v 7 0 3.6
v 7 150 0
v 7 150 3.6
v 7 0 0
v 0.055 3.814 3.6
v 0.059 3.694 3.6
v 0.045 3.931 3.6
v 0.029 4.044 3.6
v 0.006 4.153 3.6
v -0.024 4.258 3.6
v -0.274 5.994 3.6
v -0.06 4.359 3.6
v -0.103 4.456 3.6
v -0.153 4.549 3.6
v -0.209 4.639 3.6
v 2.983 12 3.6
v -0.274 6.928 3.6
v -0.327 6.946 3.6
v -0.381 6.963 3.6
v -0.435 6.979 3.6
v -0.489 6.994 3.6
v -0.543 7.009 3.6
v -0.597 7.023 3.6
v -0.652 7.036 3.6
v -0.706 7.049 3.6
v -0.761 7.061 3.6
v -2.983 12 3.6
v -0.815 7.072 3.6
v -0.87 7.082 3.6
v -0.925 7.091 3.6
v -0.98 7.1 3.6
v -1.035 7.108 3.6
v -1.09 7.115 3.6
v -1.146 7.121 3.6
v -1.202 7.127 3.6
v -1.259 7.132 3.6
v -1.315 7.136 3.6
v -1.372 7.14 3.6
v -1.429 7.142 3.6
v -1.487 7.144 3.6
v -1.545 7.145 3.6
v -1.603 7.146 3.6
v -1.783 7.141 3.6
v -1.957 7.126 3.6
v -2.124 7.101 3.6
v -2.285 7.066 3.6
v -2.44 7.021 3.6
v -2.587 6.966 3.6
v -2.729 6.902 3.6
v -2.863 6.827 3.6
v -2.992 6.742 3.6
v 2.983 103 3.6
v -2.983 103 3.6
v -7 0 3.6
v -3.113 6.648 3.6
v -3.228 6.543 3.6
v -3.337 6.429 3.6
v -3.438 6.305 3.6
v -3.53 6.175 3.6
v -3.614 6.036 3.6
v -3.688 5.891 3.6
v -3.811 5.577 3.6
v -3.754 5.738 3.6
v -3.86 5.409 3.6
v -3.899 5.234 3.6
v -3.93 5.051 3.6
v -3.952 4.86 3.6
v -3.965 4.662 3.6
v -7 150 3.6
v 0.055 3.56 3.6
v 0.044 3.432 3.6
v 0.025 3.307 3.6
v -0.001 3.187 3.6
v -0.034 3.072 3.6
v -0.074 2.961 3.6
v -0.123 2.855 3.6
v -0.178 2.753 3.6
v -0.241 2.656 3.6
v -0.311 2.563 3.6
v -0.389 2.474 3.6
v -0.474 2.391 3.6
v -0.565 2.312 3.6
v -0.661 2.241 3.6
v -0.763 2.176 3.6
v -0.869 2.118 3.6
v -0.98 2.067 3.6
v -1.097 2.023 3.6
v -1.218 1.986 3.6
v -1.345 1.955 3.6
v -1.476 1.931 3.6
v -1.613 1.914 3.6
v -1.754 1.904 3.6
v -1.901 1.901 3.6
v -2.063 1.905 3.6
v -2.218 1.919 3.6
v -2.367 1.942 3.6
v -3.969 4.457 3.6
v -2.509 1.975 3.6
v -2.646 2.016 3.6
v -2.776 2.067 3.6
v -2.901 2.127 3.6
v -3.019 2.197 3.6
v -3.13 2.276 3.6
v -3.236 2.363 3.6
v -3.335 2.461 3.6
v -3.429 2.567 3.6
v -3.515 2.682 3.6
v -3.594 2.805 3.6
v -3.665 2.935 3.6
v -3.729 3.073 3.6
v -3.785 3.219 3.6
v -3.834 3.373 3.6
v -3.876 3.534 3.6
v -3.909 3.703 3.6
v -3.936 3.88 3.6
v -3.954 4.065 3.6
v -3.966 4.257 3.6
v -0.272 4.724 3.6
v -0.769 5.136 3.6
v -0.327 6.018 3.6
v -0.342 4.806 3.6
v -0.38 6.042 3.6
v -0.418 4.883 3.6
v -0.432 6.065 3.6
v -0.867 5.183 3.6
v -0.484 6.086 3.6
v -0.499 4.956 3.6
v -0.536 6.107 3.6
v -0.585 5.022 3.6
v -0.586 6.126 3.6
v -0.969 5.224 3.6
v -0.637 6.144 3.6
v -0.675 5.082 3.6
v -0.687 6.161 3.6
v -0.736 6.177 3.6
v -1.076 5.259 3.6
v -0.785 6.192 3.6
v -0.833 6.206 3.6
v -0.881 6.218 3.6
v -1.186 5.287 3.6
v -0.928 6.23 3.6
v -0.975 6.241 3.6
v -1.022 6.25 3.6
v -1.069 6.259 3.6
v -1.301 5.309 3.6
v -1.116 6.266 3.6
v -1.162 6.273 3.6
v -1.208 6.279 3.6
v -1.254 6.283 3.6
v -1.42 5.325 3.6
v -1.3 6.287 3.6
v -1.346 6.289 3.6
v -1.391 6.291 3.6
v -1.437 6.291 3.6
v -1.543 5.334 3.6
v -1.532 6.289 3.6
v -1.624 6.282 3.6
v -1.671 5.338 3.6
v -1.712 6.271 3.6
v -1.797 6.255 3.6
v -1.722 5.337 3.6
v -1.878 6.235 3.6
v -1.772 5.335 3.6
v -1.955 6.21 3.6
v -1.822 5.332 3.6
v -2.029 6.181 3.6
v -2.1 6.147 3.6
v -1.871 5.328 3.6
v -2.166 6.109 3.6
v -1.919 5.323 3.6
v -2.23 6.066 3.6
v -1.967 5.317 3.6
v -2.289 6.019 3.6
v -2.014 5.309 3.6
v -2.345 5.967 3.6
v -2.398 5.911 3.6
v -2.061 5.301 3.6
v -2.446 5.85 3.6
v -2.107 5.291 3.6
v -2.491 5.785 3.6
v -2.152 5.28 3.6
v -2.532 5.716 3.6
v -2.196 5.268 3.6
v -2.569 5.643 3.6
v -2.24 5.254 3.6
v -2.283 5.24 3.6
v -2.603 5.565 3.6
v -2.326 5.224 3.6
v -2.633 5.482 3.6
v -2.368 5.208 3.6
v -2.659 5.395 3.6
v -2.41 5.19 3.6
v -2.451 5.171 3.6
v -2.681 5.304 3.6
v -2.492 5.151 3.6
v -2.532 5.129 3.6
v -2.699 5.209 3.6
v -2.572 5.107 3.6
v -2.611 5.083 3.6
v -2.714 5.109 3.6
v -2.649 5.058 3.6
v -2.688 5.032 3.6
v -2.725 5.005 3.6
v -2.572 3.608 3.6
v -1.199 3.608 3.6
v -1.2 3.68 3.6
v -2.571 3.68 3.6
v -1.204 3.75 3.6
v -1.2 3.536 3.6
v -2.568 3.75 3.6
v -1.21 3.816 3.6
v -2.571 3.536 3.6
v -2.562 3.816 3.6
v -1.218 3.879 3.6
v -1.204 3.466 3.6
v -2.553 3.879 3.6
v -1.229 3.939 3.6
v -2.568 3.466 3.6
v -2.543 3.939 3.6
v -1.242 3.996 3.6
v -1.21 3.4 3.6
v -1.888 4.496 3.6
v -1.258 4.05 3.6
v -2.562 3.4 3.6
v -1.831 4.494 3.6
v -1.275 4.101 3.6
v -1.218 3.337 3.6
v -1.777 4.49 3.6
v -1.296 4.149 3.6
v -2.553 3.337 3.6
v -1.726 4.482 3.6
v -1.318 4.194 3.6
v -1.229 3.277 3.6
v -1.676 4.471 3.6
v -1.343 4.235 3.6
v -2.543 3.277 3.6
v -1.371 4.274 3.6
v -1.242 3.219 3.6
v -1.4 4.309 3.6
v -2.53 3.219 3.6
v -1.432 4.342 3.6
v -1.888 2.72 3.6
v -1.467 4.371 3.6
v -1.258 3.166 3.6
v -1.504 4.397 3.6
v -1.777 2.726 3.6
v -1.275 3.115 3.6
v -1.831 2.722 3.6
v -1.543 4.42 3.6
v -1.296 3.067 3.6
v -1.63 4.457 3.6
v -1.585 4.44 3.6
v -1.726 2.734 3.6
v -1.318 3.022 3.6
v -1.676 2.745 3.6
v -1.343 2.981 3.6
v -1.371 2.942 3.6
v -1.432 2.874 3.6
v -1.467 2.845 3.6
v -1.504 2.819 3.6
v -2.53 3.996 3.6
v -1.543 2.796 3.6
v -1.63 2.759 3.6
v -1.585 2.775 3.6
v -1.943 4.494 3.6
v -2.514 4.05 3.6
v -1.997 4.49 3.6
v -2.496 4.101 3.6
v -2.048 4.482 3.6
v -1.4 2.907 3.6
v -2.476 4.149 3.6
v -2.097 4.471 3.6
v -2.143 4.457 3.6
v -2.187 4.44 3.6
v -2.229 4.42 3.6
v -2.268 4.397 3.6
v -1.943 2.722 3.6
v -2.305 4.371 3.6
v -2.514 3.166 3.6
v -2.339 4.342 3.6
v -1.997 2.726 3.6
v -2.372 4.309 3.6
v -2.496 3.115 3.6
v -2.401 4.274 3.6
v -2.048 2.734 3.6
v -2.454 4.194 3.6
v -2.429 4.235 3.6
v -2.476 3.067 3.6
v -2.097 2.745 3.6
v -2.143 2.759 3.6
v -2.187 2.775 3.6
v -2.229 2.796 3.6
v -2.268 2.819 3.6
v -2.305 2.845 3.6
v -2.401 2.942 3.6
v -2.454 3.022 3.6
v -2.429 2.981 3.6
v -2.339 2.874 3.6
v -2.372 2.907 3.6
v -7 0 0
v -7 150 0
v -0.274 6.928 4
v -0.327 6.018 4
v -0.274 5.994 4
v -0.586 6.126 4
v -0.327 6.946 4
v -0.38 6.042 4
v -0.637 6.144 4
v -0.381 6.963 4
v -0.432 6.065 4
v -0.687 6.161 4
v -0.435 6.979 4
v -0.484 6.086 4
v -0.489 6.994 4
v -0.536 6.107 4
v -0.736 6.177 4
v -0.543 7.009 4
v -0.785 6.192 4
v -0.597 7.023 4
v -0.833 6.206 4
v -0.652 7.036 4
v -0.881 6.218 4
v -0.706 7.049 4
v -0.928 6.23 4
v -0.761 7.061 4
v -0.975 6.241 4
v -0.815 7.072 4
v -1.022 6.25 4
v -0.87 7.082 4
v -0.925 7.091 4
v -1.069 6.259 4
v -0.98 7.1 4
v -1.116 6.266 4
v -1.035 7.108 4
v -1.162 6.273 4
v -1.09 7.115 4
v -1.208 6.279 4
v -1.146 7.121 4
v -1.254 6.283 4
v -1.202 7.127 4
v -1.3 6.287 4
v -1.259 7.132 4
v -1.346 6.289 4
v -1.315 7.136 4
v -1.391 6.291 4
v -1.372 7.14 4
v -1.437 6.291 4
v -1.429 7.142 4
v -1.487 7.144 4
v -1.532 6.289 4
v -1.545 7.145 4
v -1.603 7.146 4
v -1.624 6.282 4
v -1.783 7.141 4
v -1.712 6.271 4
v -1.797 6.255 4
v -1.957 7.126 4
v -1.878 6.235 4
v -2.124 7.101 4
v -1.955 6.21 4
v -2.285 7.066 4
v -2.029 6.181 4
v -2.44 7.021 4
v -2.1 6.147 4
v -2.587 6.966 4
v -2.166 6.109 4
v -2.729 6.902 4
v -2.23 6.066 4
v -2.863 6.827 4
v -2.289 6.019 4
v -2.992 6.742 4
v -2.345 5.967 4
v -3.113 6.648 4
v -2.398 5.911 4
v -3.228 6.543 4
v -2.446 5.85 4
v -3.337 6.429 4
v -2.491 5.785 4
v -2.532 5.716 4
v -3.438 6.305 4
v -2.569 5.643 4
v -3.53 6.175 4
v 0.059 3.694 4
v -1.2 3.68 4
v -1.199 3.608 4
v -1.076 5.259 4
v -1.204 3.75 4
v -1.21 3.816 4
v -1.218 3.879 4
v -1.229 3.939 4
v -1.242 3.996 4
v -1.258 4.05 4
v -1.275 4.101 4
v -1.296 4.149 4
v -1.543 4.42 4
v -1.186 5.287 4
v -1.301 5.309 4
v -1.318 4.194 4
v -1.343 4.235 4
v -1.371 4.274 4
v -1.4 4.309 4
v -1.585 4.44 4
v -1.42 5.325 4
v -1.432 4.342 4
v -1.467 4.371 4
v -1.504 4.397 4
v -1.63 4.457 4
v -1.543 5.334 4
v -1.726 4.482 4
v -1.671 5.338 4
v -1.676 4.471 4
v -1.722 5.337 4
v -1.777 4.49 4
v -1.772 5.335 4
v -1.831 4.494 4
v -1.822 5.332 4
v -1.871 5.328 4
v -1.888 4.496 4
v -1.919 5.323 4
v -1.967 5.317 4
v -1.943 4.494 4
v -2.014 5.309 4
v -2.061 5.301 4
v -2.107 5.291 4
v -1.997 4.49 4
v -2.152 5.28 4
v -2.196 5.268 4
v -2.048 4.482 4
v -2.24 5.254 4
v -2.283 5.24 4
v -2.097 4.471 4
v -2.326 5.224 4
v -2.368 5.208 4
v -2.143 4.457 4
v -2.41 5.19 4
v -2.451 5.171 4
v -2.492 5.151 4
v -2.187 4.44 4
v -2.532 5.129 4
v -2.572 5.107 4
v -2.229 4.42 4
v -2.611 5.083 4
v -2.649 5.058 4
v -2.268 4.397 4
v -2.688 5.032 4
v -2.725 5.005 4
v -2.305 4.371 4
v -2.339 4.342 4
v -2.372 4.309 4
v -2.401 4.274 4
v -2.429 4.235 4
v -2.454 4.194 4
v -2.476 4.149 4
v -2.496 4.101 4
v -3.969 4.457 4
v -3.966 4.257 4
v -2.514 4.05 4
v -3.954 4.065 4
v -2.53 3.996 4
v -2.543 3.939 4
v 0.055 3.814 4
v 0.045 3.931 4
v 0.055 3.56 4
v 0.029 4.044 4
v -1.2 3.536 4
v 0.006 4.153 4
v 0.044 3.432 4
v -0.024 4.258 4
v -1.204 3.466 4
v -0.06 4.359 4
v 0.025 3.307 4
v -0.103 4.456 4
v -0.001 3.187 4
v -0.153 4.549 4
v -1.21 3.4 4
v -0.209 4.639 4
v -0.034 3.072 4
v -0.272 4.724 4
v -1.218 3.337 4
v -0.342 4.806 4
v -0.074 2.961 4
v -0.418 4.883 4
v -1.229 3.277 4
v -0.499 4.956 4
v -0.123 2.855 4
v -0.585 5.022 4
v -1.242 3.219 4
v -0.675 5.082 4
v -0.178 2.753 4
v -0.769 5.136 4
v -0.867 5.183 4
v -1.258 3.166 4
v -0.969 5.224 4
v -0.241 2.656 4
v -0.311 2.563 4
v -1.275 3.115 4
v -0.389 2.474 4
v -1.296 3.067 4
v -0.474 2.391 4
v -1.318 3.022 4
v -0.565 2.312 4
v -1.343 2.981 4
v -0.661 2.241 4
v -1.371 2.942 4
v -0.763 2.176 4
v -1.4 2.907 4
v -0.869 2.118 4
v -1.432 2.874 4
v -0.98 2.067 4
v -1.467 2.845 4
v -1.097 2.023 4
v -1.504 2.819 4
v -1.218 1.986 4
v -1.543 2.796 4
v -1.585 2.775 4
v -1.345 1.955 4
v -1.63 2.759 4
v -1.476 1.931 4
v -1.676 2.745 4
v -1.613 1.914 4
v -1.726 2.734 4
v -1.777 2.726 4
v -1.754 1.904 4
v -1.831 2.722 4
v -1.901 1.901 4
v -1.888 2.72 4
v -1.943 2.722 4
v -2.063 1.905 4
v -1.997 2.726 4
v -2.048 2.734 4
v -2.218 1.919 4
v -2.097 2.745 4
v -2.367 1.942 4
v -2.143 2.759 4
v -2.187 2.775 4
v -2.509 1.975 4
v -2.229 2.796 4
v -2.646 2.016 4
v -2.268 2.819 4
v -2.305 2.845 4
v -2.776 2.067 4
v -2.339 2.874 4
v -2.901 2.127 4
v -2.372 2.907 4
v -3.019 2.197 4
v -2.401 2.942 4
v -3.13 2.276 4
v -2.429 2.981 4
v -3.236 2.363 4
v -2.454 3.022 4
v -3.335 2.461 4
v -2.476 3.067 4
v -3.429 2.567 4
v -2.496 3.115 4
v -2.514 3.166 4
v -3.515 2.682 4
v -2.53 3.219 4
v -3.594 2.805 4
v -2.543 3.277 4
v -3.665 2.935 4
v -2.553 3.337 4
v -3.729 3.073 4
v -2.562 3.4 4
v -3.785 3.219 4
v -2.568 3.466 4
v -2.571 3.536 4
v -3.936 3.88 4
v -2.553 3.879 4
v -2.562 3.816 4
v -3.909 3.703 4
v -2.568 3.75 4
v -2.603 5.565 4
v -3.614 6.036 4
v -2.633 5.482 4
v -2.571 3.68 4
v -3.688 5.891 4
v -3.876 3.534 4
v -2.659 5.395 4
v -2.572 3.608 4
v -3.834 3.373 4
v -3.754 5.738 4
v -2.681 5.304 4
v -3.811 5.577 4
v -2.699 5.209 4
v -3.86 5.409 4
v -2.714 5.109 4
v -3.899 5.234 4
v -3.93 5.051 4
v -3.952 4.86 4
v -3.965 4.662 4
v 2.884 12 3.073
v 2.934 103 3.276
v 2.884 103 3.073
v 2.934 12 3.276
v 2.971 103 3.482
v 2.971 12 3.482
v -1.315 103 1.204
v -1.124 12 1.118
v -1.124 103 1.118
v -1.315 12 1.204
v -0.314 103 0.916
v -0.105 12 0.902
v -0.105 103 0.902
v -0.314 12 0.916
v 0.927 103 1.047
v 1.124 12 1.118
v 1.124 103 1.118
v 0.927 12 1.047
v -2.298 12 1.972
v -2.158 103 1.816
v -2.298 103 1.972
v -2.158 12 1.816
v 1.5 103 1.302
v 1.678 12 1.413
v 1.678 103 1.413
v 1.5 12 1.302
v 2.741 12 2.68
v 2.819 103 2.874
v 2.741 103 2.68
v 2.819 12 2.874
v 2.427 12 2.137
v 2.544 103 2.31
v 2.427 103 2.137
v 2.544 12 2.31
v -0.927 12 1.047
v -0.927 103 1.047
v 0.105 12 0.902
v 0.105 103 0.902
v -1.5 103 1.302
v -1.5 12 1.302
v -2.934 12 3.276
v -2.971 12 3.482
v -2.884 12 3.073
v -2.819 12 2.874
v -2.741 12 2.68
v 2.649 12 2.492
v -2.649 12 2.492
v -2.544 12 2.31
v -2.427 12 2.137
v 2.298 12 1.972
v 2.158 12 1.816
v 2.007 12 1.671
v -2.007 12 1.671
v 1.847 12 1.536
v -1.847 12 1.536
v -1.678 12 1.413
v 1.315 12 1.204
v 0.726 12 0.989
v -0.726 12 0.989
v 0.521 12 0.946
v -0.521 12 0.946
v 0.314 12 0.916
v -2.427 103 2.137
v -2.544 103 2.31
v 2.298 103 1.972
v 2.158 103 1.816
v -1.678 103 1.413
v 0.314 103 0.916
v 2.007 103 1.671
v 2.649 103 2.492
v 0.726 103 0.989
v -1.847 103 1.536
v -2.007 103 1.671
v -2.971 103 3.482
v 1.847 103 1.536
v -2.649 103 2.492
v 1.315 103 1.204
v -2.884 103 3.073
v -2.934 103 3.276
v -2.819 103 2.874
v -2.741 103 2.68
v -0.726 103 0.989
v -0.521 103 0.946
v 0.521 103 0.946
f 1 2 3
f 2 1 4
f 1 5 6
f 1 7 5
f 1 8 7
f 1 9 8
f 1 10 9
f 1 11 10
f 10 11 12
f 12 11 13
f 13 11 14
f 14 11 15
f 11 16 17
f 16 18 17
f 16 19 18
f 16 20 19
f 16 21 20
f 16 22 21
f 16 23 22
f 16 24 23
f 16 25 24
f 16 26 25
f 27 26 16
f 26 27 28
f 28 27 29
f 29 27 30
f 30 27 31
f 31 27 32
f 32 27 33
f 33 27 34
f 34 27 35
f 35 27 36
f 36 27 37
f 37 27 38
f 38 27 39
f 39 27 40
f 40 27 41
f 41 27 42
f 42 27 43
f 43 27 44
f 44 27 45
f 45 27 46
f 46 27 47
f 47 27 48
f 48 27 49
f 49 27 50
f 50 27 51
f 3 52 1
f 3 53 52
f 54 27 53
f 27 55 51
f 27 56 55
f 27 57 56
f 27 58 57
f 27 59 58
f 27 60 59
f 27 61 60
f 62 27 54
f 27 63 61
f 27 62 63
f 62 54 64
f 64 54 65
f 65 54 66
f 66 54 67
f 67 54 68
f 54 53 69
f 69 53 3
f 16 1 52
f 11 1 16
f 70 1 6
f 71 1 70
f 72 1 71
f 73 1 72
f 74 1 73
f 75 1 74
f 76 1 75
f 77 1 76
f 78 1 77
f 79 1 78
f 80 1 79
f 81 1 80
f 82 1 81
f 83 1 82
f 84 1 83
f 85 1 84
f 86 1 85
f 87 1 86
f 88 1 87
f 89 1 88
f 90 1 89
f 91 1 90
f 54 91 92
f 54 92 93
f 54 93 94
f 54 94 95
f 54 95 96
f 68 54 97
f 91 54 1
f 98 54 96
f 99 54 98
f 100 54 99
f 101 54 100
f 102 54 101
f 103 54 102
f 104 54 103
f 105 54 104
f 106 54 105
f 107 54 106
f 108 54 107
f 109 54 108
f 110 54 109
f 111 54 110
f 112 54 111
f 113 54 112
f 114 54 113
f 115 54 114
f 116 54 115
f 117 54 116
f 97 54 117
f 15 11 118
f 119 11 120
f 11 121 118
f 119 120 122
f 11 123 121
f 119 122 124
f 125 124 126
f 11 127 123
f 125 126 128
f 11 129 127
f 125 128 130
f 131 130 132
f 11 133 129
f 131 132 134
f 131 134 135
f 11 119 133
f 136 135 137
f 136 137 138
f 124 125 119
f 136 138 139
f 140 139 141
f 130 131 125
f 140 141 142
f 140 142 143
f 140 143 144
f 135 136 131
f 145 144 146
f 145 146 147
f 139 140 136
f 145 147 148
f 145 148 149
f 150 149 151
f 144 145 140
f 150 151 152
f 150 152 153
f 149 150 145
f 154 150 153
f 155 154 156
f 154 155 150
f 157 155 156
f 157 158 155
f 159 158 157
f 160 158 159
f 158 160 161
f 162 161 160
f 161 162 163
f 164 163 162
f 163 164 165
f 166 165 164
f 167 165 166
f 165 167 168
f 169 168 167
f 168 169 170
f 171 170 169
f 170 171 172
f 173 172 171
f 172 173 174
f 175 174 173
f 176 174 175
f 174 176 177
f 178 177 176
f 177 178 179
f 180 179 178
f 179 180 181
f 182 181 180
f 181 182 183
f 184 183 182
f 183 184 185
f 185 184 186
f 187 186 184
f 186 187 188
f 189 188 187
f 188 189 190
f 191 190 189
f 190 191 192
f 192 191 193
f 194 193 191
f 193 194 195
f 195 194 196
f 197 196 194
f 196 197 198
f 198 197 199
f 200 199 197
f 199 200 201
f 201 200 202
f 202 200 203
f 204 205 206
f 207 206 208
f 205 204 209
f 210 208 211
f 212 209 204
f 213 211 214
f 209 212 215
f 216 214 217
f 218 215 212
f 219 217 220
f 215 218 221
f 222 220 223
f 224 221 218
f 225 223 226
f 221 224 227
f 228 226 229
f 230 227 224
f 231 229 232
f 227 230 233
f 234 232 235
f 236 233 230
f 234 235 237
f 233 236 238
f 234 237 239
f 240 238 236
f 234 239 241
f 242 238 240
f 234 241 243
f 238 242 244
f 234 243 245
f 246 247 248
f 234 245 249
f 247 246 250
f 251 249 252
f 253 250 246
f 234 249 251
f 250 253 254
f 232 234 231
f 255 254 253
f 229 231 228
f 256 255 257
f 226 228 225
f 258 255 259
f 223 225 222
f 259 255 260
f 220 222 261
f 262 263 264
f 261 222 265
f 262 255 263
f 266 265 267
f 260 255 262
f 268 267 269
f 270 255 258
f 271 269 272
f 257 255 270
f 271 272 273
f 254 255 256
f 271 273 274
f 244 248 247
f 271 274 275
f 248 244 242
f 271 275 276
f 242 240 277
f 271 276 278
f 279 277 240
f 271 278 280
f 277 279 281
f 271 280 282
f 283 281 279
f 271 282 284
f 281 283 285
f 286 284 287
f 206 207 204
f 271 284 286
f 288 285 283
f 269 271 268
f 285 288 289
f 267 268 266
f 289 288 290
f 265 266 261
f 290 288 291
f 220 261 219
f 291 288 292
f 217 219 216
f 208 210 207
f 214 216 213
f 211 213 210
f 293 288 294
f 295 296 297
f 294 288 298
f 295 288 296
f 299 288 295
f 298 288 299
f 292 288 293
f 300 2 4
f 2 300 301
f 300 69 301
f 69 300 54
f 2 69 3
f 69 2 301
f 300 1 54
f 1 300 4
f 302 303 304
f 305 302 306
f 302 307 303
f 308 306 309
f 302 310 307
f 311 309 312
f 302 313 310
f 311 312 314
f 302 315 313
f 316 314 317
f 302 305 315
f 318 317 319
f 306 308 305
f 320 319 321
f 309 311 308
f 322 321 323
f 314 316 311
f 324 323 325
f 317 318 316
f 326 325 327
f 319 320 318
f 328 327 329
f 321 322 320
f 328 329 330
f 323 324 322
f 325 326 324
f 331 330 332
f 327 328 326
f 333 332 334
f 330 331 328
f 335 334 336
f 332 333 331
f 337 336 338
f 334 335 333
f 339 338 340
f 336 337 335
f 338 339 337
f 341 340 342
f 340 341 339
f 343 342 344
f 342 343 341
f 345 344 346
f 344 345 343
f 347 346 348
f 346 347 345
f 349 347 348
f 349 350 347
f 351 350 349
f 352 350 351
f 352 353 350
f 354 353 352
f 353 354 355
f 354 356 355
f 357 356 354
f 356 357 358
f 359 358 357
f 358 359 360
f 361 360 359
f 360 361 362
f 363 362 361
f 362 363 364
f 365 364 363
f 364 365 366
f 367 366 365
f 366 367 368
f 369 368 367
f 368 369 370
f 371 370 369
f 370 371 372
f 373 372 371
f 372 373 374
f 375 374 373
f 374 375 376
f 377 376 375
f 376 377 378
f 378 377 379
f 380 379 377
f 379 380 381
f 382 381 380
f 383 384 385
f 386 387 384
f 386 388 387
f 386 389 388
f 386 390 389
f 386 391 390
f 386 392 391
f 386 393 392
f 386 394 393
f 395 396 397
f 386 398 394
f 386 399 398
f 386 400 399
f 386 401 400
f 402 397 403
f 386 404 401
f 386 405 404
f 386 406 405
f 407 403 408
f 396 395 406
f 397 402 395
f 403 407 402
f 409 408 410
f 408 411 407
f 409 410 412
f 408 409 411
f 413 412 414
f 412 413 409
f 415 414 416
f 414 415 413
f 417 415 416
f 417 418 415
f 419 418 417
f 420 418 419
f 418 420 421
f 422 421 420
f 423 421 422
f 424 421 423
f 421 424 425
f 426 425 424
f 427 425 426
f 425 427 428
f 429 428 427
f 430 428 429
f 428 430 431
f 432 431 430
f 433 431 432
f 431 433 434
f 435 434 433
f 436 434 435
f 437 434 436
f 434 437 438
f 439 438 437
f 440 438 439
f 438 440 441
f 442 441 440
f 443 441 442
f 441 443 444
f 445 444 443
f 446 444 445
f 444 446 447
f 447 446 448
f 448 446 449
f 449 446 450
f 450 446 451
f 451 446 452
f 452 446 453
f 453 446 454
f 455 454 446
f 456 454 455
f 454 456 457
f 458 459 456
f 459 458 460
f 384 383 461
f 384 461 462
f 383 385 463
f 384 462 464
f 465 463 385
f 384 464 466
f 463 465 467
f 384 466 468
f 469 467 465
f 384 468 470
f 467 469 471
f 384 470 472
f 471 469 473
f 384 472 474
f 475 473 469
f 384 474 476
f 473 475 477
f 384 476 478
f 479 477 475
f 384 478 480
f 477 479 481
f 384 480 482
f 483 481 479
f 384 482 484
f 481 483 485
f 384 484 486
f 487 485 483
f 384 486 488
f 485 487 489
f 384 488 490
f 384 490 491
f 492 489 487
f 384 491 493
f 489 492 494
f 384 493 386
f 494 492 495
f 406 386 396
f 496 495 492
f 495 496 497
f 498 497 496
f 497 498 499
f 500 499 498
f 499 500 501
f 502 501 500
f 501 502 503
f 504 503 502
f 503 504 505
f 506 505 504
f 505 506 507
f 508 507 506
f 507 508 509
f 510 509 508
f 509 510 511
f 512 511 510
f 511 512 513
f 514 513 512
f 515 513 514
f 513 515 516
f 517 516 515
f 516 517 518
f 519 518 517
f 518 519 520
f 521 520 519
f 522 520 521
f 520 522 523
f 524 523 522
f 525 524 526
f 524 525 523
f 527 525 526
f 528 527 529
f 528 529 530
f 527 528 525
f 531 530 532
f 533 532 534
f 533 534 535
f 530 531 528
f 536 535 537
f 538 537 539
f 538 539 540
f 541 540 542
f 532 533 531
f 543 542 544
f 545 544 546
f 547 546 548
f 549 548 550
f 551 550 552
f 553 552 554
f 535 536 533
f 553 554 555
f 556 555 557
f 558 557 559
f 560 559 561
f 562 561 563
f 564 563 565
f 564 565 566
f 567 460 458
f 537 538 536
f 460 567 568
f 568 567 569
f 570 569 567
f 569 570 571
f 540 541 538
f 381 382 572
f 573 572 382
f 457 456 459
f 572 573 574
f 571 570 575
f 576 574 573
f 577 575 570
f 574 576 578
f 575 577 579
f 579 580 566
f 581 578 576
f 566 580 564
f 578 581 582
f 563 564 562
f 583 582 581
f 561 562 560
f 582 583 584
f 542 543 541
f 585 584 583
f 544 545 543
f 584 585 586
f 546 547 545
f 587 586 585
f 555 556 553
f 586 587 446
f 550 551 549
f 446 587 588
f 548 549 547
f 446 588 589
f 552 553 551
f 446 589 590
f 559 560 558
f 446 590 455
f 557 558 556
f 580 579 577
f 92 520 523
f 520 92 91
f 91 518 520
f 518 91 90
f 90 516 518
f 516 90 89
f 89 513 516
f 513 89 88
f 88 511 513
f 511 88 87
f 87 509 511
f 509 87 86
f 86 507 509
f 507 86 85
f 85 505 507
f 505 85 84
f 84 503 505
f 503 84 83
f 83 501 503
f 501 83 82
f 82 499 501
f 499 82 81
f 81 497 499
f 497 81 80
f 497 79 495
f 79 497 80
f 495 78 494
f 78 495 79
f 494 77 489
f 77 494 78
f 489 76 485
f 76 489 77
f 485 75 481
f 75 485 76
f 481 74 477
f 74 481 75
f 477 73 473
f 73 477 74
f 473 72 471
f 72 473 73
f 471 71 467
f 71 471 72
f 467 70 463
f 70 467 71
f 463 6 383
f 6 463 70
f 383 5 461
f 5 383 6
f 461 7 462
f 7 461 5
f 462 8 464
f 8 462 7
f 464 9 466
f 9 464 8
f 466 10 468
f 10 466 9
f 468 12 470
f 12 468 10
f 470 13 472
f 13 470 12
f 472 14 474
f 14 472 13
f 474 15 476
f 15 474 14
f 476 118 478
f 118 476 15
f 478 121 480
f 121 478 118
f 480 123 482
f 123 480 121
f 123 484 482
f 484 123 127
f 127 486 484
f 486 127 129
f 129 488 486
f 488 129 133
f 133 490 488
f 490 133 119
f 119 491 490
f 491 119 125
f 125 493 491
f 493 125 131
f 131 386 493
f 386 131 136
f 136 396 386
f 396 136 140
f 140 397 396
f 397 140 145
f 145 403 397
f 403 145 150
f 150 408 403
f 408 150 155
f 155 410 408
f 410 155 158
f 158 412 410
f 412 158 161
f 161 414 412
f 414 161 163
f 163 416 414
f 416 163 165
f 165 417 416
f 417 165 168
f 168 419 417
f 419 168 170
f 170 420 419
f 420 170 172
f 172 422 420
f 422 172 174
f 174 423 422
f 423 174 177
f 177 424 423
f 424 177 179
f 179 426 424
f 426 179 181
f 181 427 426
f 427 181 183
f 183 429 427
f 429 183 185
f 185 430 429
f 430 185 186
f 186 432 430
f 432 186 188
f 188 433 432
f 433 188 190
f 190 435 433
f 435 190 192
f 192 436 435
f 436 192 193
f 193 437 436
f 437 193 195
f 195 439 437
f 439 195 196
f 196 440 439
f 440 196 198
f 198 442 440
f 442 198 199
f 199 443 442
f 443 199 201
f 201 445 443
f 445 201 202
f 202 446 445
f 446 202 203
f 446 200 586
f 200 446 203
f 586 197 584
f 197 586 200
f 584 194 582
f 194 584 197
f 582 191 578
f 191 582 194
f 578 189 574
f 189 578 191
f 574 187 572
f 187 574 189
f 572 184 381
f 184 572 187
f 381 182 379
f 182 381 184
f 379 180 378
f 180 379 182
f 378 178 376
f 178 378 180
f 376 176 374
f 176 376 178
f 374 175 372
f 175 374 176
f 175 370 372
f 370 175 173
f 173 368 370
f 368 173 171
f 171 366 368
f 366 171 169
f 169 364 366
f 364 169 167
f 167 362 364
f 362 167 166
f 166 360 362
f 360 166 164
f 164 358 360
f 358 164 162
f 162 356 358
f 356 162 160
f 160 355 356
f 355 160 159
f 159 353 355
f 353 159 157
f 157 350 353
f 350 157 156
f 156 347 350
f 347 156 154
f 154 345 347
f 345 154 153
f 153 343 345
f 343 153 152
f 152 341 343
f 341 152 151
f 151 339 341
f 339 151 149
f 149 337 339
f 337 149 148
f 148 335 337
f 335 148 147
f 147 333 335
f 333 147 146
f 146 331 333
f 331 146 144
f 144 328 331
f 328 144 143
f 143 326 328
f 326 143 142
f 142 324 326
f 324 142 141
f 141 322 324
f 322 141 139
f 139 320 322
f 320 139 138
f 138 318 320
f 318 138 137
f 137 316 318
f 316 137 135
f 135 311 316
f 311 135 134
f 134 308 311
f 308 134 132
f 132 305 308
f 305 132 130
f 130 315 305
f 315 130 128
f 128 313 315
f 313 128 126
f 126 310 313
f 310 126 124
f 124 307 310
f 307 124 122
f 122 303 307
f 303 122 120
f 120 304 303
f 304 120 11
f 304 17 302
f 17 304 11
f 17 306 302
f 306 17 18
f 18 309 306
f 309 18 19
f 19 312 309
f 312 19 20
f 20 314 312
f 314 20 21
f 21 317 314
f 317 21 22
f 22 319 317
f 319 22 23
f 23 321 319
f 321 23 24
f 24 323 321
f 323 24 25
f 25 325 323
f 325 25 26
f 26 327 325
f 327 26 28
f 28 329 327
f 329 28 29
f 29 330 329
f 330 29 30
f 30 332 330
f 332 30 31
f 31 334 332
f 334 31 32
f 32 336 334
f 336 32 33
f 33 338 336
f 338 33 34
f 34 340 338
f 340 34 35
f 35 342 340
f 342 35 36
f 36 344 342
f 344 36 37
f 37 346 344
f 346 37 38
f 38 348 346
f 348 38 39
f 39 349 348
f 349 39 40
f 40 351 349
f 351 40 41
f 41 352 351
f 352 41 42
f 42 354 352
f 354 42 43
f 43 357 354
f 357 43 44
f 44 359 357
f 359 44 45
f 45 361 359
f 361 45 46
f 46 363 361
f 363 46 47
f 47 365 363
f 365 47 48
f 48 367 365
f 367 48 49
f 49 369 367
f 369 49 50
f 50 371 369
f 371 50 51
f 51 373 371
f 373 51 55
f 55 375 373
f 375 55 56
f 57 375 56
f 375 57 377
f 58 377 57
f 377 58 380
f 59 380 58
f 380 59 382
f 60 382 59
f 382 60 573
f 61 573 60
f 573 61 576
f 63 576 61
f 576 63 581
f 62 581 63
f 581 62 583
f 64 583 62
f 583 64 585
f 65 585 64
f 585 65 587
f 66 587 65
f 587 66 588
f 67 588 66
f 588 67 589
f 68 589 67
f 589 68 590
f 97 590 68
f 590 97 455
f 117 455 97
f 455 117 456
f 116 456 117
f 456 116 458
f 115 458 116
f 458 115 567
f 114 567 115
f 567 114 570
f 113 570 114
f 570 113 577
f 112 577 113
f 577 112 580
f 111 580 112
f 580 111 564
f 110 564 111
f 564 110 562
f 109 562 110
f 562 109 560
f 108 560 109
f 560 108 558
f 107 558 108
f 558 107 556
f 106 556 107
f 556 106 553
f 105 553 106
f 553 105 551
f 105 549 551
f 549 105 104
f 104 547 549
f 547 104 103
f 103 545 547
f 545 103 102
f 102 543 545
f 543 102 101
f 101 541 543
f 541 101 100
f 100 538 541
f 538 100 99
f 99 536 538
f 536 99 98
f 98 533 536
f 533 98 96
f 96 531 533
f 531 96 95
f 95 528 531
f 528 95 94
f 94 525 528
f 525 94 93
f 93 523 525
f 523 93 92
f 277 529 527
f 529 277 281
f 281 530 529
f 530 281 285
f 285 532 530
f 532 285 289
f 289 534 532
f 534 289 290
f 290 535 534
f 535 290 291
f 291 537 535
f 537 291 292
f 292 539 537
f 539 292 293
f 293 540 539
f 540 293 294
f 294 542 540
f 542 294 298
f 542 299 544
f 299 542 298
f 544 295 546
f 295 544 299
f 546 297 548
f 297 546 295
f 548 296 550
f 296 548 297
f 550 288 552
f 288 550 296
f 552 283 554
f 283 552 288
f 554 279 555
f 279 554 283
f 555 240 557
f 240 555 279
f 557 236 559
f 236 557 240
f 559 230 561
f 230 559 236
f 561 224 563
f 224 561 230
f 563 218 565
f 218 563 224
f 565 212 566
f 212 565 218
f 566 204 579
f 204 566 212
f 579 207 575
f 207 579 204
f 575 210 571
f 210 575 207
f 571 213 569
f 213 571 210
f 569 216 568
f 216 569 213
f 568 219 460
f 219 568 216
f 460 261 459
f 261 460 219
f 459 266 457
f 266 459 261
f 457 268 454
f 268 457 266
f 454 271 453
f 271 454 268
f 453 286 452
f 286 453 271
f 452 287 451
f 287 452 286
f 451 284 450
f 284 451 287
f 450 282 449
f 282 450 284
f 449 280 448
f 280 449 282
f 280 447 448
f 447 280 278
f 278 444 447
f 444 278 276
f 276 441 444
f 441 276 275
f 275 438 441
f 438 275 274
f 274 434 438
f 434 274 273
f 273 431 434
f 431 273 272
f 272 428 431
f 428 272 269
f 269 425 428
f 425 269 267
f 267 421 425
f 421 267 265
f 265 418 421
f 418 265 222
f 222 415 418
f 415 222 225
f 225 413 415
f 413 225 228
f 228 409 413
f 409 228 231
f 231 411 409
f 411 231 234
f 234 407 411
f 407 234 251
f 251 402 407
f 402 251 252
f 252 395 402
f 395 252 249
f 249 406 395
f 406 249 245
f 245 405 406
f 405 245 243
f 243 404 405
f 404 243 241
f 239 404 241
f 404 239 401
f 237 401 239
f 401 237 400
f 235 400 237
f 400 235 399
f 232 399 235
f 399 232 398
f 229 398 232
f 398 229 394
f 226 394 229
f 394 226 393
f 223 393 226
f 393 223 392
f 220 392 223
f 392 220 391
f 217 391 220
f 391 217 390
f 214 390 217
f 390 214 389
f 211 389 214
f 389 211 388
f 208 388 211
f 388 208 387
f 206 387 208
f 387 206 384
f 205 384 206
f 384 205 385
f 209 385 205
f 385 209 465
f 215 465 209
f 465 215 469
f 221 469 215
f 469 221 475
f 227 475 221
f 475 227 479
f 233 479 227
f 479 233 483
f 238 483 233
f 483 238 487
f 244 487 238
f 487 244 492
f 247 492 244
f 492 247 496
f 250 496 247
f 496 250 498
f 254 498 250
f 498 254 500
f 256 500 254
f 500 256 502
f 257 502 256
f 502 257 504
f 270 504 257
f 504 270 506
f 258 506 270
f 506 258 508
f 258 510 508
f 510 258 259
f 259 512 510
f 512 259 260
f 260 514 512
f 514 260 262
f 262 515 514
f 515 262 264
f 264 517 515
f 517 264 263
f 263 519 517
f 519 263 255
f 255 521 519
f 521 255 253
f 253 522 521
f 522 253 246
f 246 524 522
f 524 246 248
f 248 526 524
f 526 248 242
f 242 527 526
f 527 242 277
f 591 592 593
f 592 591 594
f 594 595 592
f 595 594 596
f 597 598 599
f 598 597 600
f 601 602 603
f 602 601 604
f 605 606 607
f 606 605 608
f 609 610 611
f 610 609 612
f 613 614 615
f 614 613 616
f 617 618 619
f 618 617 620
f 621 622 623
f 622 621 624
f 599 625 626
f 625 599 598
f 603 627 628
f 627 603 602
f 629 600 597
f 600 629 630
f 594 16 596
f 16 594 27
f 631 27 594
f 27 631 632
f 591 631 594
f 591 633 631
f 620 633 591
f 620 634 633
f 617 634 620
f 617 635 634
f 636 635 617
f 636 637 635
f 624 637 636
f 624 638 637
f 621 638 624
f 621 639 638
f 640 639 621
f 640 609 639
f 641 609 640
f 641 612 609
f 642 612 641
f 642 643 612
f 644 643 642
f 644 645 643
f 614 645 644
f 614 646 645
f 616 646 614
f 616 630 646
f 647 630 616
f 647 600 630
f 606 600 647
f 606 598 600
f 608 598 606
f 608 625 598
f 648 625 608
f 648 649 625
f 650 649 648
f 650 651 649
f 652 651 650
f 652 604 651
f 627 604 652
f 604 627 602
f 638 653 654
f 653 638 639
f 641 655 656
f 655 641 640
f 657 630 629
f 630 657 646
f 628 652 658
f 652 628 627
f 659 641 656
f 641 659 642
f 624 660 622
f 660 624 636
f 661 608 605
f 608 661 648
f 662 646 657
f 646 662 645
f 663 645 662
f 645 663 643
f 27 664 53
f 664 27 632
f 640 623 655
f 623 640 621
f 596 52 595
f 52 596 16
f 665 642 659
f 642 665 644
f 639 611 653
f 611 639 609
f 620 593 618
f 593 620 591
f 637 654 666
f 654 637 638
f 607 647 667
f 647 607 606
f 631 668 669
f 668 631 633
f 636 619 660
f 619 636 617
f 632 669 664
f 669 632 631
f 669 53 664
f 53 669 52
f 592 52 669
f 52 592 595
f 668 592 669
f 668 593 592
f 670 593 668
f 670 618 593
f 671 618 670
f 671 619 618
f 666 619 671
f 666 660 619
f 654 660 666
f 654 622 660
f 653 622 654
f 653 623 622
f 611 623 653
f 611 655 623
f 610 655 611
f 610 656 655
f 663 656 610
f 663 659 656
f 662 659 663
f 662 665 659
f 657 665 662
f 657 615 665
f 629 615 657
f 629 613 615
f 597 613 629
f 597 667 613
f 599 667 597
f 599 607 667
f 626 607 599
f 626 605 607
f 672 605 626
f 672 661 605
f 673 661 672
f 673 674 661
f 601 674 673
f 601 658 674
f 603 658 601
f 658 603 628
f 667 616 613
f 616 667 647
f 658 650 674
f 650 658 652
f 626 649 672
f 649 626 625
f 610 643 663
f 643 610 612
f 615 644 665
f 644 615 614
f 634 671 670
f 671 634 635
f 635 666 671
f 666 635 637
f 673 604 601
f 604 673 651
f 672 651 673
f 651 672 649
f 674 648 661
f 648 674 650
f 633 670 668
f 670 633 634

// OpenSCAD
// file: module/drill-bit-storage.scad
/*
    Drill bit storage
*/

$fn=90;  // accuracy


// Constants (Don't change)
storageLenght = 100; // Not Bit lenght
maxBitLenght  = 70;  // Check bit lenght
storageWidth  = 10;  // Minimum width

// Bit dependent
bitDiameter = 4.0;



module drillBitStorage (bitDiameter,maxBitLenght,
	storageWidth,storageLenght){

// Automatic Variables  (Don't change)
diameterText      = str(bitDiameter);
storageHight      = bitDiameter*0.6; 
bitRadius         = bitDiameter/2;
bitPositionHeight = storageHight+bitDiameter*0.05; 


// Delition for crating drill track
difference() {

// Union for text and storage
union(){

// Storage 
translate([
    -storageWidth/2,    // Centering
    0, 
    0
    ]) 
cube(size = [
    storageWidth,
    storageLenght,
    storageHight
    ]);

// Milimiter dimension text
translate([
    -4.4,               // Fine deling x-axis
    2,                  // Fine deling y-axis 
    storageHight         
    ])
linear_extrude(height=0.4)text(
    diameterText,  // Dynamic text
    size=5,
    font="tohoma:style=bold",
    spacing=0.9
    );
    
// End of union    
}  

// Begining of Delition
// Drill tracl
rotate([90,0,0])
translate([
    0,                   // x-axis
    bitPositionHeight,   // Z-axis
    -(maxBitLenght+12)    // y-axis
    ])  
cylinder(
    h = maxBitLenght,    // y-axis
    r = bitRadius        // x-axis 
    );      

// End of Delition
}}
// main file
/*
    Drill bit storage
*/

$fn=90;  // accuracy

// import module
use <module/drill-bit-storage.scad>;



// Tootale lenght of the unit
storageLenght = 150; 

// Width of the unit
storageWidth  = 14;  // (Constant under 4mm)  

// The lenght of the drill bit
maxBitLenght  = 91;  

// Drill bit diameter  
bitDiameter = 6.0;


// Call the module
drillBitStorage 
    (bitDiameter,maxBitLenght,storageWidth,storageLenght);
